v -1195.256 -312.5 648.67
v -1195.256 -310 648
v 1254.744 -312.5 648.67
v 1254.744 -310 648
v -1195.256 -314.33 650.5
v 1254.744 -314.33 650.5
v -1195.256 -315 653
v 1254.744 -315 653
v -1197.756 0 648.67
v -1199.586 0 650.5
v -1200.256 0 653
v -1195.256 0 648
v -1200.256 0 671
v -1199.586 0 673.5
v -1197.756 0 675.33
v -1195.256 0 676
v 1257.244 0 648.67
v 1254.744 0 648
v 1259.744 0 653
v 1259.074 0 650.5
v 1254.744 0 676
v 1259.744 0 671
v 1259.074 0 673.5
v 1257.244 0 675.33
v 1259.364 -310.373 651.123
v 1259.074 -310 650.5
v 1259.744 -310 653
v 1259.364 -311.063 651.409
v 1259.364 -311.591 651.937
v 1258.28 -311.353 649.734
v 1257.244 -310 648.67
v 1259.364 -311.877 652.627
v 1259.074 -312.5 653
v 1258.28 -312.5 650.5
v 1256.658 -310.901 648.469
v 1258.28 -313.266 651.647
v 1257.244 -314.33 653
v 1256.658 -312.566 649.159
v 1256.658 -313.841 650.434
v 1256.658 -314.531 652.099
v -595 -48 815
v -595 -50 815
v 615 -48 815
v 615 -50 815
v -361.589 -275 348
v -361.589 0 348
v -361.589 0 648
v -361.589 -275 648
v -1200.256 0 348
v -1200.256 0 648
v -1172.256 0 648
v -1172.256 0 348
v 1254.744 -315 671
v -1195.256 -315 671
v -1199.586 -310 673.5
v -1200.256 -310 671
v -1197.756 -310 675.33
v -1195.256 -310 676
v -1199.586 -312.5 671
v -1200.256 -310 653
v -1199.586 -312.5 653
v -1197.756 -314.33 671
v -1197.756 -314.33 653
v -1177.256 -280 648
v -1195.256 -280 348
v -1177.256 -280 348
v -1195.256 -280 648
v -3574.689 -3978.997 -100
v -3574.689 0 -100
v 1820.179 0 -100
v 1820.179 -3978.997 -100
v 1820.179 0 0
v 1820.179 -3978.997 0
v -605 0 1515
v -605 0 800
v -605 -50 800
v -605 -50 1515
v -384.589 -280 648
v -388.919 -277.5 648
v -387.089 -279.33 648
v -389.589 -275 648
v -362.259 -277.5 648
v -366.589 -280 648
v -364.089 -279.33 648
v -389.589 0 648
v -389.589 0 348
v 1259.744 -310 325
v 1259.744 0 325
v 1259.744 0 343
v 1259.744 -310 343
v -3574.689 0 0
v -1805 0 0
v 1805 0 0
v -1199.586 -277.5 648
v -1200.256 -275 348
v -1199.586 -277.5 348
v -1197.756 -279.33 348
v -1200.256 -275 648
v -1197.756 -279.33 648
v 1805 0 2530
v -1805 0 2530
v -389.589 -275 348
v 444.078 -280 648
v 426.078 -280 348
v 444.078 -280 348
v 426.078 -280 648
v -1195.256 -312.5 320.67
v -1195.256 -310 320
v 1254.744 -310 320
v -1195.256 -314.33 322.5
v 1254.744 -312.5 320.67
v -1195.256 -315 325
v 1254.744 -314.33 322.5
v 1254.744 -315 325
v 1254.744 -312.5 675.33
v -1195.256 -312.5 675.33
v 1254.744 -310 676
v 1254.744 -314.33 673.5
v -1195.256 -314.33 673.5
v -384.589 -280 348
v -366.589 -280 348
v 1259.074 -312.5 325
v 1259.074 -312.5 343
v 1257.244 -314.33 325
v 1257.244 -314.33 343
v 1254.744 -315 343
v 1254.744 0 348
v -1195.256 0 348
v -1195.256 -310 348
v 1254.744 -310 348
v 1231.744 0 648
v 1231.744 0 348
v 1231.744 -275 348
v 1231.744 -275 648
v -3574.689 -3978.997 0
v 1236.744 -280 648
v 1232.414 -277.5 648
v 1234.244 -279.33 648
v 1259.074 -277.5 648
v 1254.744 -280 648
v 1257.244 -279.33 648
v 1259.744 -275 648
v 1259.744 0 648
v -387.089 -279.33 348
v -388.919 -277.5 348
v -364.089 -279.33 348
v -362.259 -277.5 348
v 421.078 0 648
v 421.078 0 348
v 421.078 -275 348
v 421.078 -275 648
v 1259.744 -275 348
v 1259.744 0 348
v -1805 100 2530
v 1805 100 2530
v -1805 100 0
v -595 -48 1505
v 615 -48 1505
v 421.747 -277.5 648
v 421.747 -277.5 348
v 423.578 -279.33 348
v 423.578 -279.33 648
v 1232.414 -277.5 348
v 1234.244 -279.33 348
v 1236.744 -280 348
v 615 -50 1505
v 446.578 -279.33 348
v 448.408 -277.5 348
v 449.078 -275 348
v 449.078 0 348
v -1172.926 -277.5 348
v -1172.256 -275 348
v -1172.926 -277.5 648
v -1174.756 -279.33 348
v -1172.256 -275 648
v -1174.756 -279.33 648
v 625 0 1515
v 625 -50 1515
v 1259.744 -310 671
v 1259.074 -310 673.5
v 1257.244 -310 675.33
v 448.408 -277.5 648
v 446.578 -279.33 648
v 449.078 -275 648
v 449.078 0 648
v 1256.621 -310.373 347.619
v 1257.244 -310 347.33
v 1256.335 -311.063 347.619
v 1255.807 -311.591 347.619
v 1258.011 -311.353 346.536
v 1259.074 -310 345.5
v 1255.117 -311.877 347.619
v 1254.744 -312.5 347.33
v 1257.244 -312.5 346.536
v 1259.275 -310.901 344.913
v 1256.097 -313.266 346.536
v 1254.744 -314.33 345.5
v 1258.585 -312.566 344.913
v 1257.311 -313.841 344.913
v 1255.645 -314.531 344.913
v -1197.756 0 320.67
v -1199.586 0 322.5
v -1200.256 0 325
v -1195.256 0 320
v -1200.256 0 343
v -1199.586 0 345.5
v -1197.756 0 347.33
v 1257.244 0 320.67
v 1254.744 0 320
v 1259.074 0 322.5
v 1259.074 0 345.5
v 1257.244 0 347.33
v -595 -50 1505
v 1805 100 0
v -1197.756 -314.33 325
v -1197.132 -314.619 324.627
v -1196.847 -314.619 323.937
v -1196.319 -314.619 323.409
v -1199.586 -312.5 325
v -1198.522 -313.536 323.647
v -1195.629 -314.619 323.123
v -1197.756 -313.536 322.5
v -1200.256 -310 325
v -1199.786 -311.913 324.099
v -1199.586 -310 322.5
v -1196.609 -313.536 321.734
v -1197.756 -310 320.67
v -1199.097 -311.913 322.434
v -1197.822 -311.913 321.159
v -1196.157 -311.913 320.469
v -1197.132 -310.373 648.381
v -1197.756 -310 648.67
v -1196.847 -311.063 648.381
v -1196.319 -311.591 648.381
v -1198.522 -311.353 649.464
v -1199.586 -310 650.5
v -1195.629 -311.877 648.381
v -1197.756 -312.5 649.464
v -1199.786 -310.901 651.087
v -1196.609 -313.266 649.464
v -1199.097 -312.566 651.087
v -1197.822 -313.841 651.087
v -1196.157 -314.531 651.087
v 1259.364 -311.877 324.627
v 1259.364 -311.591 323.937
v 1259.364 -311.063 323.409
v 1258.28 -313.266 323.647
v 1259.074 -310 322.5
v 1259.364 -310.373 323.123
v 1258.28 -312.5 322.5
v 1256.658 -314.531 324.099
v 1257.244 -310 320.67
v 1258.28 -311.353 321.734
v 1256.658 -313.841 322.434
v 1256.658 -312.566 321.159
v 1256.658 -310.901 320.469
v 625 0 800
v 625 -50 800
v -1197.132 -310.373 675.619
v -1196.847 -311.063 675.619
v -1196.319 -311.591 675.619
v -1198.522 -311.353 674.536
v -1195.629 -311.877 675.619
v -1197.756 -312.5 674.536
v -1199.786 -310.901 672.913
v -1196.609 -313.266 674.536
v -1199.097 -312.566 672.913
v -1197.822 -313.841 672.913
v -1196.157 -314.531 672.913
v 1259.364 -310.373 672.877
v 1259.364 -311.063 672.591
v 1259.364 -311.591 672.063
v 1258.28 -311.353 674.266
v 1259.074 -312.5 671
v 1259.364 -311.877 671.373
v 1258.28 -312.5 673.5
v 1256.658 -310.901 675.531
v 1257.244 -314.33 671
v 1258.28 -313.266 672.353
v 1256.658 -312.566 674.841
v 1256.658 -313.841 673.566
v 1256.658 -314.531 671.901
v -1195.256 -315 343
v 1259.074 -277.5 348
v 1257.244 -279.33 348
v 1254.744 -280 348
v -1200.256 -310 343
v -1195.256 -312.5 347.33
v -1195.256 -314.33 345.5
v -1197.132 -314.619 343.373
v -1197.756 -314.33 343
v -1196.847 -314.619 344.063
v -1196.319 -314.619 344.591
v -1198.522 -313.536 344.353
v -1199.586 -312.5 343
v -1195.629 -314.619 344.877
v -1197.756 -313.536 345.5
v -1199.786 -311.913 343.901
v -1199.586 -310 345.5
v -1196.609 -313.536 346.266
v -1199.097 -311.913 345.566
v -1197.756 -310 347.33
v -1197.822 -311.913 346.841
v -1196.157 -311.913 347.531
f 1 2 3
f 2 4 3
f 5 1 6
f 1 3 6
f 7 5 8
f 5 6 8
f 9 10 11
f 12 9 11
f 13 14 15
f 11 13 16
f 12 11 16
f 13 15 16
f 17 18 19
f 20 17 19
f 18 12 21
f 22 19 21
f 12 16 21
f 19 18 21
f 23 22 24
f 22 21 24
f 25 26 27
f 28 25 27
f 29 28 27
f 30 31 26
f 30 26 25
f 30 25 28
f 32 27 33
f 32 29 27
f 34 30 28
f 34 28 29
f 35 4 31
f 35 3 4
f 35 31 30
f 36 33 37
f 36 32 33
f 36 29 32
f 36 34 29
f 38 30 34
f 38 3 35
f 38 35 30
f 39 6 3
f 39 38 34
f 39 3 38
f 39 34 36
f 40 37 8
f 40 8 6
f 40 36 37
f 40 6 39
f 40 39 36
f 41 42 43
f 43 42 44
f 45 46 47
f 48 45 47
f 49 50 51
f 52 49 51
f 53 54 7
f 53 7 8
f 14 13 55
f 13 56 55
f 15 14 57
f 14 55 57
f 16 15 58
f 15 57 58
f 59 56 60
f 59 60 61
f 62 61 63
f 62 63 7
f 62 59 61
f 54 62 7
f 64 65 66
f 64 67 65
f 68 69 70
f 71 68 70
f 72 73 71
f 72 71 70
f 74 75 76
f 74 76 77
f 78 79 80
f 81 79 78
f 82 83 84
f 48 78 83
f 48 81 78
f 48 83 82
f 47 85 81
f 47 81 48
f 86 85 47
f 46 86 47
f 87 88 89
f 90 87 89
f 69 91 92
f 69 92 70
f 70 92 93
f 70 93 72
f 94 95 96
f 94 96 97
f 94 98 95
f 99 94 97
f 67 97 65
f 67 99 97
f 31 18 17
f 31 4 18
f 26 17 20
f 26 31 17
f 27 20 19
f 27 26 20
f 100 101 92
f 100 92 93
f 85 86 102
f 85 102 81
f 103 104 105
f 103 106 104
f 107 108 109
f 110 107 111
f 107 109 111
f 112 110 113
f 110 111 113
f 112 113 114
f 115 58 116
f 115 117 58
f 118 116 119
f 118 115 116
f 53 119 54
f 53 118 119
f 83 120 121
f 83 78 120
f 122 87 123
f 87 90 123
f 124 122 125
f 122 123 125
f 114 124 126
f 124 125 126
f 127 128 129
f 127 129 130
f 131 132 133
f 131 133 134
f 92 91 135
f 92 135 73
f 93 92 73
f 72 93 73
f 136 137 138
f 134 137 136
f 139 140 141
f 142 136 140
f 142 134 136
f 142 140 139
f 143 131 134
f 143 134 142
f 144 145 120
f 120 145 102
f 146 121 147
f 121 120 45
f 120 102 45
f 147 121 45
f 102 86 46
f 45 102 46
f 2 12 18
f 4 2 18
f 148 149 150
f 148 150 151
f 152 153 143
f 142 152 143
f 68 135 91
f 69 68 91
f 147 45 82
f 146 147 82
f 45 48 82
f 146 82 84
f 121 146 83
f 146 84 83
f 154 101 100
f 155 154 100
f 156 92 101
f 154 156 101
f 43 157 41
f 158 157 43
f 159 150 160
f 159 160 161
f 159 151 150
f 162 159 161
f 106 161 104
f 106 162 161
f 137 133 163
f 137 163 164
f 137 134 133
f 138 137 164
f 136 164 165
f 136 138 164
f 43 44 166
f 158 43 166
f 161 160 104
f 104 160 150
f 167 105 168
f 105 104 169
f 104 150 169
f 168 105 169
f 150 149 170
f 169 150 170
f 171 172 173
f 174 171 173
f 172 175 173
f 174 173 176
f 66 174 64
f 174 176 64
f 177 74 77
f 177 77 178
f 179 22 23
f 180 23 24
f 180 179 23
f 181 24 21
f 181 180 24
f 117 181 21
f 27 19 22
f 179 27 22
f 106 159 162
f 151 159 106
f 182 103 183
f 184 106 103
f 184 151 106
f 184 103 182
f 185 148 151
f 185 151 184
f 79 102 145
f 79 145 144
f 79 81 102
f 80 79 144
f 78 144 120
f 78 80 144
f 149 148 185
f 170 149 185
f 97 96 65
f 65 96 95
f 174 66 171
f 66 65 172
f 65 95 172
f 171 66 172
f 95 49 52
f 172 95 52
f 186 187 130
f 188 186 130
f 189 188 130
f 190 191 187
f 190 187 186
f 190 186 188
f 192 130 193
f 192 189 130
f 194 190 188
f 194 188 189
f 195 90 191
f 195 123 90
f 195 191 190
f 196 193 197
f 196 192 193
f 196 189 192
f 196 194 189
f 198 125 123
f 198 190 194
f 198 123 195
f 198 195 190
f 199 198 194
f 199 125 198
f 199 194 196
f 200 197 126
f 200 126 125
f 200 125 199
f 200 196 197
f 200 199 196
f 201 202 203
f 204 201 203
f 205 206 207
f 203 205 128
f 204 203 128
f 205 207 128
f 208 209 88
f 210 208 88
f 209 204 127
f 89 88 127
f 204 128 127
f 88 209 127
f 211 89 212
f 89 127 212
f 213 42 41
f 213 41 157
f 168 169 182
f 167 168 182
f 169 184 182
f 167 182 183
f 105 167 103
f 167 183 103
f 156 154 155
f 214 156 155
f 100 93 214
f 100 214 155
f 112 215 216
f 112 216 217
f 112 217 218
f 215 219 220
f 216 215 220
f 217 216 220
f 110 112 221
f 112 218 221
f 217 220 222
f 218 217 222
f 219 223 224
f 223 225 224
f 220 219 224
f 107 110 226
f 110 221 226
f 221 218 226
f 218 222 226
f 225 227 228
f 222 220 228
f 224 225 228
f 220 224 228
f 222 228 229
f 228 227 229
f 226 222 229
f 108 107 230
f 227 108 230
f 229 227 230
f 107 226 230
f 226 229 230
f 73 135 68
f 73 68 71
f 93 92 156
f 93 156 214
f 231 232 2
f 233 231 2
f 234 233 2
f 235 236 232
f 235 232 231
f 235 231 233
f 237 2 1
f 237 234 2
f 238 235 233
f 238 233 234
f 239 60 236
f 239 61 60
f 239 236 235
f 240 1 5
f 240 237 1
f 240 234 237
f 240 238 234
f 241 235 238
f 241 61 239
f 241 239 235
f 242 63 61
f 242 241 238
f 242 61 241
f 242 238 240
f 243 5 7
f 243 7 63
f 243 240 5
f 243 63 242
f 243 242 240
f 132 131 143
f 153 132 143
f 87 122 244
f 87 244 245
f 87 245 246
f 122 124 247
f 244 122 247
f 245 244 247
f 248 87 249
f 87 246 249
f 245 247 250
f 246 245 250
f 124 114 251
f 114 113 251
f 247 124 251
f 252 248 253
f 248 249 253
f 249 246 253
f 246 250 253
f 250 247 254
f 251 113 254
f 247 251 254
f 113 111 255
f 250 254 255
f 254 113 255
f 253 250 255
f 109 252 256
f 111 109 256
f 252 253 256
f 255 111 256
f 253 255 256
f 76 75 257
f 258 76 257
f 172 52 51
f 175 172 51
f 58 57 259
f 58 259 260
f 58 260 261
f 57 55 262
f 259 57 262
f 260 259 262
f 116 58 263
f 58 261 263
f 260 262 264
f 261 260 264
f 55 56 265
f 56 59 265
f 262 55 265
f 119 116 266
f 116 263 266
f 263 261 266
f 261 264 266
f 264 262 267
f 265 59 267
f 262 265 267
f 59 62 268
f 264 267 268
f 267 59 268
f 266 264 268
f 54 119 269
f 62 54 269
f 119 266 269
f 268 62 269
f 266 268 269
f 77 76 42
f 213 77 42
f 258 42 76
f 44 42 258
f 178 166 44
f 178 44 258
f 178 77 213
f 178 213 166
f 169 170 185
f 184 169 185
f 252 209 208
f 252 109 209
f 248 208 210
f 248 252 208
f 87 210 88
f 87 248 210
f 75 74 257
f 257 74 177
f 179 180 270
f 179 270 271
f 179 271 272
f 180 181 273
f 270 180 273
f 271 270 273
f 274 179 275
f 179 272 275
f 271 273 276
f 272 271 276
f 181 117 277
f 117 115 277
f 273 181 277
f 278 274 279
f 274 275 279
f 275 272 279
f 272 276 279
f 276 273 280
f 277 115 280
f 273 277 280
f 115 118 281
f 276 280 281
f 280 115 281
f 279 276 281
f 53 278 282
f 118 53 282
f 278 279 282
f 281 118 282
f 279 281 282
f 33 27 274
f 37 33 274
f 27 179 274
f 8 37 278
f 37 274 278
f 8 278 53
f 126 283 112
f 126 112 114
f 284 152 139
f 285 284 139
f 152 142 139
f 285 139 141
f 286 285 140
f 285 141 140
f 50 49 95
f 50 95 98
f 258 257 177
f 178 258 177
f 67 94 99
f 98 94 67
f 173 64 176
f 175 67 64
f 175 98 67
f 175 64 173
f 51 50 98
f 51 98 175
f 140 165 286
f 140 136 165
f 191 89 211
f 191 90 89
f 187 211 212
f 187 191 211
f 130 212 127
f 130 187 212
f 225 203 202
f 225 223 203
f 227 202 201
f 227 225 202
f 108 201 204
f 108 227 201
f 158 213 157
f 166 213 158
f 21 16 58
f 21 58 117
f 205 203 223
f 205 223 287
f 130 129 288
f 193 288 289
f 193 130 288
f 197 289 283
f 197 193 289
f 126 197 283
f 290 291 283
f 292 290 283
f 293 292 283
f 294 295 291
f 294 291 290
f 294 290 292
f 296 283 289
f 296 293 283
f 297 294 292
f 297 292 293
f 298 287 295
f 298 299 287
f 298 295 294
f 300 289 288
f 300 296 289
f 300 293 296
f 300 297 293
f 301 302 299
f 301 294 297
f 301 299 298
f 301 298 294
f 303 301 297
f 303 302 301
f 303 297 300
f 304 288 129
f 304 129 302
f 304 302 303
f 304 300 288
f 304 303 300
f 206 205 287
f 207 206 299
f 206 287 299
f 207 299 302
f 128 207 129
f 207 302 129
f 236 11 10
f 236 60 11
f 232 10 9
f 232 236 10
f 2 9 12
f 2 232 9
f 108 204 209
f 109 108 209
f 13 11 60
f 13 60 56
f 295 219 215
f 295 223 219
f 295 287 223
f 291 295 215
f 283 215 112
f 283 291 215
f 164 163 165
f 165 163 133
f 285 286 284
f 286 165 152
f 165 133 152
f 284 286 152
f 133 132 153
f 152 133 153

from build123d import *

# Parameters (mm, degrees)
F0_W      = 3610
F0_H      = 2530
F1_DEPTH  = 100
F2_W      = 5394.867659
F2_H      = 3978.996754
F3_DEPTH  = 100
F4_W      = 1230
F4_H      = 715
F5_DEPTH  = 50
F6_W      = 1210
F6_H      = 690
F7_DEPTH  = 2
F8_W      = 2460
F8_H      = 28
F9_DEPTH  = 315
F10_W     = 28
F10_H     = 300
F11_DEPTH = 280
F12_R     = 5
F13_R     = 5


with BuildPart() as f1:
    # F0 (on Front) → F1 (new body)
    with BuildSketch(Plane.XZ):
        with Locations((0, 1265)):
            Rectangle(F0_W, F0_H)
    extrude(amount=-F1_DEPTH)

    # F2 (on Top) → F3 (join)
    with BuildSketch(Plane.XY):
        with Locations((-877.25532, -1989.498377)):
            Rectangle(F2_W, F2_H)
    extrude(amount=-F3_DEPTH)


with BuildPart() as f5:
    # F4 (on face) → F5 (new body)
    with BuildSketch(Plane.XZ):
        with Locations((10, 1157.5)):
            Rectangle(F4_W, F4_H)
    extrude(amount=F5_DEPTH)

    # F6 (on face) → F7 (cut)
    with BuildSketch(Plane.XZ.offset(50)):
        with Locations((10, 1160)):
            Rectangle(F6_W, F6_H)
    extrude(amount=-F7_DEPTH, mode=Mode.SUBTRACT)


with BuildPart() as f9:
    # F8 (on face) → F9 (new body)
    with BuildSketch(Plane.XZ):
        with Locations((29.744167, 662)):
            Rectangle(F8_W, F8_H)
        with Locations((29.744167, 334)):
            Rectangle(F8_W, F8_H)
    extrude(amount=F9_DEPTH)

    # F12
    f12_edges = [f9.edges().sort_by_distance(p)[0] for p in [
        (-1200.255833, -315, 662),
        (-1200.255833, -157.5, 676),
        (-1200.255833, -157.5, 648),
        (29.744167, -315, 648),
        (29.744167, -315, 676),
        (-1200.255833, -157.5, 348),
        (-1200.255833, -157.5, 320),
        (-1200.255833, -315, 334),
        (29.744167, -315, 320),
        (1259.744167, -157.5, 676),
        (1259.744167, -315, 334),
        (1259.744167, -157.5, 320),
        (1259.744167, -157.5, 348),
        (1259.744167, -157.5, 648),
        (1259.744167, -315, 662),
        (29.744167, -315, 348),
    ]]
    fillet(f12_edges, radius=F12_R)


with BuildPart() as f11:
    # F10 (on face) → F11 (new body)
    with BuildSketch(Plane.XZ):
        with Locations((-1186.255833, 498)):
            Rectangle(F10_W, F10_H)
        with Locations((1245.744167, 498)):
            Rectangle(F10_W, F10_H)
        with Locations((-375.589166, 498)):
            Rectangle(F10_W, F10_H)
        with Locations((435.077501, 498)):
            Rectangle(F10_W, F10_H)
    extrude(amount=F11_DEPTH)

    # F13
    f13_edges = [f11.edges().sort_by_distance(p)[0] for p in [
        (-1200.255833, -280, 498),
        (-389.589166, -280, 498),
        (1231.744167, -280, 498),
        (-1172.255833, -280, 498),
        (-361.589166, -280, 498),
        (1259.744167, -280, 498),
        (421.077501, -280, 498),
        (449.077501, -280, 498),
    ]]
    fillet(f13_edges, radius=F13_R)


solid = Compound([f1.part, f5.part, f9.part, f11.part])
